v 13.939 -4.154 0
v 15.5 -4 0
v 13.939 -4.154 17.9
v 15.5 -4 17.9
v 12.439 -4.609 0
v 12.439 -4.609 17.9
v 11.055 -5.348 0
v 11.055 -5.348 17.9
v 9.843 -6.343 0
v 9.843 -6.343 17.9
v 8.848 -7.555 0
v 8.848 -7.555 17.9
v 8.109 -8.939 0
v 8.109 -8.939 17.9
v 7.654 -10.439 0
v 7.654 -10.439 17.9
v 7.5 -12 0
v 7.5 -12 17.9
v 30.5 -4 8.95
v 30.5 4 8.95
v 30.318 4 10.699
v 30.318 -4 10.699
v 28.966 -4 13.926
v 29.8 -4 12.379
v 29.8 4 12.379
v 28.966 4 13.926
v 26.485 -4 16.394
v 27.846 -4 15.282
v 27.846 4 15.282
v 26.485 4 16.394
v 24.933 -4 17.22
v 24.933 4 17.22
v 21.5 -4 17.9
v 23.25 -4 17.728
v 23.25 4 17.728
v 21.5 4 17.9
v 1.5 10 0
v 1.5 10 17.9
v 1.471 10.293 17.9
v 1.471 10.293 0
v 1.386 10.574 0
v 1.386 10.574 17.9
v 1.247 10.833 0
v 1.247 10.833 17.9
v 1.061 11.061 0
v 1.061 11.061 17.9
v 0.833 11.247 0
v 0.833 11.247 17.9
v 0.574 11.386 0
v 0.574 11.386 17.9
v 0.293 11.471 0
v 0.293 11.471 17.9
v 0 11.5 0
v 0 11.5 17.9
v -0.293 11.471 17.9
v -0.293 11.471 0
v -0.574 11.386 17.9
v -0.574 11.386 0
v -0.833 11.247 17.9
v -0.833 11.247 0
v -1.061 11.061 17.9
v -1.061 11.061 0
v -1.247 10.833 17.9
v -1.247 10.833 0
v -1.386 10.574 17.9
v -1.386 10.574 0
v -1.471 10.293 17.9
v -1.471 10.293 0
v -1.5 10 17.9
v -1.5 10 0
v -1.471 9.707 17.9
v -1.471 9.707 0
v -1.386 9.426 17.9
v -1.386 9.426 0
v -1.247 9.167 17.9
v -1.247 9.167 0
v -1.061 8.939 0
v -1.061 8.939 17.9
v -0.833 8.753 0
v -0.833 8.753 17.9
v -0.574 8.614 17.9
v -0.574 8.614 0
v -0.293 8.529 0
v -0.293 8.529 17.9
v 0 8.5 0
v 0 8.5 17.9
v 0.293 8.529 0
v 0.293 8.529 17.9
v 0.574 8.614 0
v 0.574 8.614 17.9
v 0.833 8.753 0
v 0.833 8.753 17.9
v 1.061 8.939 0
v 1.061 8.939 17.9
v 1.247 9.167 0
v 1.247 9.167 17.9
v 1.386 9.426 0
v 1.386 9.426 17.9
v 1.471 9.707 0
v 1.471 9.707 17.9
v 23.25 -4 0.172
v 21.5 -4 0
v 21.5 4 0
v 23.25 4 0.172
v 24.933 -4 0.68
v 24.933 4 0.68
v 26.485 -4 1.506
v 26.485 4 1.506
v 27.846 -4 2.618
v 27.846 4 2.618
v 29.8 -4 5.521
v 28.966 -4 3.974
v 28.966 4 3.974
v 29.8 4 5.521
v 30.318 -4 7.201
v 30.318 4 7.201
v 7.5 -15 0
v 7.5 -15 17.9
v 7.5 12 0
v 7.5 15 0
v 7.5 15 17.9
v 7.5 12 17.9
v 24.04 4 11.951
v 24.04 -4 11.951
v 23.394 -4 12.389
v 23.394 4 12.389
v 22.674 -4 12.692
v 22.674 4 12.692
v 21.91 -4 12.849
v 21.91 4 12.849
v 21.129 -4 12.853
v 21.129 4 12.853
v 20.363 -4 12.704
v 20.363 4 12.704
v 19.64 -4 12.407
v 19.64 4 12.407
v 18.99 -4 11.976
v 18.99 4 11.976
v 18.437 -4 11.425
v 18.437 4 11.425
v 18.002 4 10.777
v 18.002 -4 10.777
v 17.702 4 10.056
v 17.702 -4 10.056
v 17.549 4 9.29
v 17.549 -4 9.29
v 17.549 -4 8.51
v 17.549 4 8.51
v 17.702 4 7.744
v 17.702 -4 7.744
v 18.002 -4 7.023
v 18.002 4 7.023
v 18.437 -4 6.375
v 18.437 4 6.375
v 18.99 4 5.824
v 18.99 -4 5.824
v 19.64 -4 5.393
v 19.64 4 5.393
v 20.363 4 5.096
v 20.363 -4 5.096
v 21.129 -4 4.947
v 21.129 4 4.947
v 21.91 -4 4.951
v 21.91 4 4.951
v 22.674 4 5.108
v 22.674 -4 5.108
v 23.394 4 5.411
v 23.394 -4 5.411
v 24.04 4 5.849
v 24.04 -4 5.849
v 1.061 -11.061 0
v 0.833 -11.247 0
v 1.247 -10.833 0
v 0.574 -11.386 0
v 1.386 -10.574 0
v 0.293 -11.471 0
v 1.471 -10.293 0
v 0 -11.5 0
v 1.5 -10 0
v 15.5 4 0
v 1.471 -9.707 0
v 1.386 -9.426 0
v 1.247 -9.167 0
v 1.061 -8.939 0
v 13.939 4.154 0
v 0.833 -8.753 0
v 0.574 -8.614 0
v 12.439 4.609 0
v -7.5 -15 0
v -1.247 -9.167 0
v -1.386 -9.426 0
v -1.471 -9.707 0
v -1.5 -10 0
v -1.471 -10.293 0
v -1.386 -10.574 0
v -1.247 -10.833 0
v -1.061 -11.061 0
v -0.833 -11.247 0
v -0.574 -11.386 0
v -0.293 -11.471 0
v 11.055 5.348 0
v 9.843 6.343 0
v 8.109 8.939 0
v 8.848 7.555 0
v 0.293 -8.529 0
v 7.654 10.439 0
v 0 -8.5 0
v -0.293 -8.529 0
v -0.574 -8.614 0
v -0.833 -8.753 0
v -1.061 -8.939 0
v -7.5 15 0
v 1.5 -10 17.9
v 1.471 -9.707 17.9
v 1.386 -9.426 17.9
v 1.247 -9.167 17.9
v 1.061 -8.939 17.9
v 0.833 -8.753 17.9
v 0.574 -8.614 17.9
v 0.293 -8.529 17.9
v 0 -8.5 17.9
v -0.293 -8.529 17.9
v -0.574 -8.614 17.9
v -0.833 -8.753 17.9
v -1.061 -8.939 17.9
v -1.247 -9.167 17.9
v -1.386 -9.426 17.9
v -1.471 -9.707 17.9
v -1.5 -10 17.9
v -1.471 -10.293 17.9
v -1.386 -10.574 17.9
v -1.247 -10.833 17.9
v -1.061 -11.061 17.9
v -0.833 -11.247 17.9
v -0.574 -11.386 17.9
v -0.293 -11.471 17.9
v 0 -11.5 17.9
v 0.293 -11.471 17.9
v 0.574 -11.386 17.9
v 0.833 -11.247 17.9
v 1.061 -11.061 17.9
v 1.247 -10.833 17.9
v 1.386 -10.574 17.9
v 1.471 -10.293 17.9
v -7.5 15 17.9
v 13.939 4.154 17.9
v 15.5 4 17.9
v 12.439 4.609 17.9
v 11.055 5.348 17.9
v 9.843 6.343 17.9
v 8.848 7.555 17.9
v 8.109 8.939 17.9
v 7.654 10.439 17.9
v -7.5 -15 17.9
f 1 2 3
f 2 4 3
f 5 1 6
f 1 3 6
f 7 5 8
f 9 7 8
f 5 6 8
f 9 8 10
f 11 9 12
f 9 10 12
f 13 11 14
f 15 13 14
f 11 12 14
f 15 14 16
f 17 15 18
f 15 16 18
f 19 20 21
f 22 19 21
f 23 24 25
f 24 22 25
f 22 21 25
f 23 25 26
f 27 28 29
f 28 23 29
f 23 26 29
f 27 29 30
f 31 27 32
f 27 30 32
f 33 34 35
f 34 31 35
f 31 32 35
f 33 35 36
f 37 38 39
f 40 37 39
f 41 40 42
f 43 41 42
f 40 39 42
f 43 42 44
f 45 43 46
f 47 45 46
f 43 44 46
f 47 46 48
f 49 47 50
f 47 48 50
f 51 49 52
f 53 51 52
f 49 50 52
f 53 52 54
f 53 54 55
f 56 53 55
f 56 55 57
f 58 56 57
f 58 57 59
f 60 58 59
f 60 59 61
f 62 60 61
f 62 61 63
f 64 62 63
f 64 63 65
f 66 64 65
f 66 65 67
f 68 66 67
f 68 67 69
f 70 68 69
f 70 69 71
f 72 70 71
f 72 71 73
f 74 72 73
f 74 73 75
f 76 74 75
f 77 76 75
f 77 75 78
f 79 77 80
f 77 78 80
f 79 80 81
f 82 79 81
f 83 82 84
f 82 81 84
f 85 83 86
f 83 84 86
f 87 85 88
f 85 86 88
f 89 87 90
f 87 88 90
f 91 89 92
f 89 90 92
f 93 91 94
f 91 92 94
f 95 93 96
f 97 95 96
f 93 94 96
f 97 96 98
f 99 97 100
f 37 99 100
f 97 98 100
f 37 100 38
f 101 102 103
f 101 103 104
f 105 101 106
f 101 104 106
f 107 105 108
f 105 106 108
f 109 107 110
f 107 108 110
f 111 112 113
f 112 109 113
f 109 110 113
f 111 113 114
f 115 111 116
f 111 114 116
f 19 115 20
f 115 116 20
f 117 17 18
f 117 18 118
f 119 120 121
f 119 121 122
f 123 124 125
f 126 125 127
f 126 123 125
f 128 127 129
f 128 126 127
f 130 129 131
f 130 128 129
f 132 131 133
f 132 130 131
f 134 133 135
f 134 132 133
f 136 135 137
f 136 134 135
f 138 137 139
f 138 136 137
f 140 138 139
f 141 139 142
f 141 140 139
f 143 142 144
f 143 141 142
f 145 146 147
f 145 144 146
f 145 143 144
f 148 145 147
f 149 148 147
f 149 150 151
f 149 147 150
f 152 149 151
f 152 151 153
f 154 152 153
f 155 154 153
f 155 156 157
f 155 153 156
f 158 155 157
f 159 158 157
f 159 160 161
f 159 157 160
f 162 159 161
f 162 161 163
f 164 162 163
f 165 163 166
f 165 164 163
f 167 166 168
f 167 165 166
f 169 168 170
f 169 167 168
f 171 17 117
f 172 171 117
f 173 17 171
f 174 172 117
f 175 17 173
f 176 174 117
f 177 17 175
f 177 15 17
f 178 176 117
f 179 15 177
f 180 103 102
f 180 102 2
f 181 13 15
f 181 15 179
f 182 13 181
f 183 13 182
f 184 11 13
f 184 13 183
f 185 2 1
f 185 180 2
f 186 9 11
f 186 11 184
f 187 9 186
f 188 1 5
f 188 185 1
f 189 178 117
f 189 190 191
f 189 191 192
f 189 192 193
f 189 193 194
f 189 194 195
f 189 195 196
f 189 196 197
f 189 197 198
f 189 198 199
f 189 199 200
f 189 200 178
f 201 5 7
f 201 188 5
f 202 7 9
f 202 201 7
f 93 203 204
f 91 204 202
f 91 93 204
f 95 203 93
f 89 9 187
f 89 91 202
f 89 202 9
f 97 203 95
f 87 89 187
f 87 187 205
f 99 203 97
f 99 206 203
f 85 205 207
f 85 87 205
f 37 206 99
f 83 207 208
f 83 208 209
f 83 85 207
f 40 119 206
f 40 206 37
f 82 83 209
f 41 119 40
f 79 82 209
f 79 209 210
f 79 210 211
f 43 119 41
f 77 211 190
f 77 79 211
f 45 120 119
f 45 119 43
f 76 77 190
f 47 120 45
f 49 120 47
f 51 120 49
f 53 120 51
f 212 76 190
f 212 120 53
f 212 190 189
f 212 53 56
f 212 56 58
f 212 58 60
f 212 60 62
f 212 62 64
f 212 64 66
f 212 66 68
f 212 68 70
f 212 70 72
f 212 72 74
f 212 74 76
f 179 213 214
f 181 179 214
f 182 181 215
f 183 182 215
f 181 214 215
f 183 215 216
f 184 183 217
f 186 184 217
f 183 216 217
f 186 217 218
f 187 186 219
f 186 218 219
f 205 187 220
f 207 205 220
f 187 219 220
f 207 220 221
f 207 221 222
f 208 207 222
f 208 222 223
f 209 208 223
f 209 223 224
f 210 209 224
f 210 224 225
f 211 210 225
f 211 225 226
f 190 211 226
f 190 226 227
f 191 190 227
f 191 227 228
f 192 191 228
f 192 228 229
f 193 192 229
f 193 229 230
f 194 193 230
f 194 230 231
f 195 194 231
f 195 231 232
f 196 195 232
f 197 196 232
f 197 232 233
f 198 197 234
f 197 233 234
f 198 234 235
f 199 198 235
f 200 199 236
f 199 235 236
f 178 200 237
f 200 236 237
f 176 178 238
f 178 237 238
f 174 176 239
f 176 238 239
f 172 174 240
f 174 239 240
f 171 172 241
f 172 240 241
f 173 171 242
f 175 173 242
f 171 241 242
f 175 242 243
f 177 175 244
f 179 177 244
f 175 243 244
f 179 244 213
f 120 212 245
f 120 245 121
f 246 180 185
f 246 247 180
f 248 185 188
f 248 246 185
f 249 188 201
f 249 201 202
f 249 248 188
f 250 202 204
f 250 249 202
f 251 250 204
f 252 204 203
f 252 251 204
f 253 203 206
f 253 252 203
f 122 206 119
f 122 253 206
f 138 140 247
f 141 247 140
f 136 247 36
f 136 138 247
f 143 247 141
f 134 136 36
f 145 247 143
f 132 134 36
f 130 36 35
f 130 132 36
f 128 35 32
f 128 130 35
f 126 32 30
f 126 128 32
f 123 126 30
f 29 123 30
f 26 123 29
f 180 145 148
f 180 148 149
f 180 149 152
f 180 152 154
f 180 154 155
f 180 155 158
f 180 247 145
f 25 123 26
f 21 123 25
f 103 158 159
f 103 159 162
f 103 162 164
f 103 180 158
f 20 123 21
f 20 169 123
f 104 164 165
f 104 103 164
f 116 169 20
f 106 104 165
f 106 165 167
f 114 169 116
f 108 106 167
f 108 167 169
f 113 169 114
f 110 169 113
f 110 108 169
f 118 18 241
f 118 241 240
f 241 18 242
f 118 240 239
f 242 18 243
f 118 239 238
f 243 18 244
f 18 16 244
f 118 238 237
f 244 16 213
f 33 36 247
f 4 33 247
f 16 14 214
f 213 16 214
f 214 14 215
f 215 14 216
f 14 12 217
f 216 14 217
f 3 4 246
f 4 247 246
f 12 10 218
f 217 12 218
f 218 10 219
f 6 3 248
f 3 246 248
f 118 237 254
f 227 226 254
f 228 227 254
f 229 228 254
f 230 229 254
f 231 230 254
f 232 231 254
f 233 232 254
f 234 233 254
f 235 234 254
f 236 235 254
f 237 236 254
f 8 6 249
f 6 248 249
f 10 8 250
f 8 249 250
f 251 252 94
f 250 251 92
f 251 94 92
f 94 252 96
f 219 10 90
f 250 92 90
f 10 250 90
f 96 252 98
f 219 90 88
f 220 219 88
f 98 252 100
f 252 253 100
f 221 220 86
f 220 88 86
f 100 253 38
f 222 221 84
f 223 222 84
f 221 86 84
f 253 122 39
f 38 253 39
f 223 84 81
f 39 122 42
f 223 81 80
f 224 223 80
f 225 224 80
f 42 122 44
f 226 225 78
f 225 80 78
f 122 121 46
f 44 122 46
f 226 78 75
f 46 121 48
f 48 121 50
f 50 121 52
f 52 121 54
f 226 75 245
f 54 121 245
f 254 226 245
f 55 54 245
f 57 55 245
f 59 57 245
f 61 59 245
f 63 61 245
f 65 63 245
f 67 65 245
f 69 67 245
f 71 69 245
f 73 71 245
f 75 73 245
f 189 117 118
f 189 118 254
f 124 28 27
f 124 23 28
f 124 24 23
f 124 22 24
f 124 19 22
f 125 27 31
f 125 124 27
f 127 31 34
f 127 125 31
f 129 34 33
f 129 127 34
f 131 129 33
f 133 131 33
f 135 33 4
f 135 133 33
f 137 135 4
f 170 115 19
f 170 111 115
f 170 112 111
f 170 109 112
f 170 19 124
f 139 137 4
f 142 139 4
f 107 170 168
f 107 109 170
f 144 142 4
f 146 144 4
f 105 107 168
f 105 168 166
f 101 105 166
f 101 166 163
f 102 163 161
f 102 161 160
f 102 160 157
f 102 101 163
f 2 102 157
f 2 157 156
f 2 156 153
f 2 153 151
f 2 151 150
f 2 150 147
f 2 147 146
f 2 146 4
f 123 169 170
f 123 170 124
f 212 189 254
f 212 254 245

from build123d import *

# Parameters (mm, degrees)
BOSS_EXTRU_1_DEPTH      = 17.9
CONG_1_R                = 9
ENL_V_MAT_EXTRU_1_REACH = 42.145
ENL_V_MAT_EXTRU_2_REACH = 40.414
ESQUISSE3_R             = 1.5
CONG_2_R                = 8


with BuildPart() as part:
    # Esquisse1 → Boss.-Extru.1 (new body)
    with BuildSketch(Plane.XY):
        Polygon((7.5, 4), (30.5, 4), (30.5, -4), (7.5, -4), (7.5, -15), (-7.5, -15), (-7.5, 15), (7.5, 15), align=None)
    extrude(amount=BOSS_EXTRU_1_DEPTH)

    # Congé1
    # the kernel refuses this fillet: 9 mm, written as the material it takes off along each edge
    with BuildSketch(Plane(origin=(30.5, 26.5, 0), x_dir=(0, 0, 1), z_dir=(0, -1, 0))) as cong_1_piece_1:
        with BuildLine():
            CenterArc((CONG_1_R, CONG_1_R), CONG_1_R, 180, 90)
            Line((0, CONG_1_R), (0, 0))
            Line((0, 0), (CONG_1_R, 0))
        make_face()
    extrude(amount=53, mode=Mode.SUBTRACT)
    with BuildSketch(Plane(origin=(30.5, 26.5, 17.9), x_dir=(0, 0, -1), z_dir=(0, -1, 0))) as cong_1_piece_2:
        with BuildLine():
            CenterArc((CONG_1_R, -CONG_1_R), CONG_1_R, 90, 90)
            Line((0, -CONG_1_R), (0, 0))
            Line((0, 0), (CONG_1_R, 0))
        make_face()
    extrude(amount=53, mode=Mode.SUBTRACT)

    # Esquisse2 → Enlèv. mat.-Extru.1 (cut, up to next)
    with BuildSketch(Plane(origin=(0, 4, 0), x_dir=(1, 0, 0), z_dir=(0, 1, 0)), mode=Mode.PRIVATE) as enl_v_mat_extru_1_sk1:
        with BuildLine():
            Line((24.04, -5.84888545), (24.04, -11.95111455))
            ThreePointArc((24.04, -11.95111455), (17.53, -8.9), (24.04, -5.84888545))
        make_face()
    enl_v_mat_extru_1_tool1 = extrude(enl_v_mat_extru_1_sk1.sketch, amount=-ENL_V_MAT_EXTRU_1_REACH, mode=Mode.PRIVATE) & part.part
    add(enl_v_mat_extru_1_tool1.solids().sort_by_distance((21.06418, 4, 8.9))[0], mode=Mode.SUBTRACT)

    # Esquisse3 → Enlèv. mat.-Extru.2 (cut, up to next)
    with BuildSketch(Plane.XY.offset(17.9), mode=Mode.PRIVATE) as enl_v_mat_extru_2_sk1:
        with Locations((0, 10)):
            Circle(ESQUISSE3_R)
    enl_v_mat_extru_2_tool1 = extrude(enl_v_mat_extru_2_sk1.sketch, amount=-ENL_V_MAT_EXTRU_2_REACH, mode=Mode.PRIVATE) & part.part
    # Esquisse3 → Enlèv. mat.-Extru.2 (cut, up to next)
    with BuildSketch(Plane.XY.offset(17.9), mode=Mode.PRIVATE) as enl_v_mat_extru_2_sk2:
        with Locations((0, -10)):
            Circle(ESQUISSE3_R)
    enl_v_mat_extru_2_tool2 = extrude(enl_v_mat_extru_2_sk2.sketch, amount=-ENL_V_MAT_EXTRU_2_REACH, mode=Mode.PRIVATE) & part.part
    add(enl_v_mat_extru_2_tool1.solids().sort_by_distance((0, 10, 17.9))[0], mode=Mode.SUBTRACT)
    add(enl_v_mat_extru_2_tool2.solids().sort_by_distance((0, -10, 17.9))[0], mode=Mode.SUBTRACT)

    # Congé2
    cong_2_edges = [part.edges().sort_by_distance(p)[0] for p in [
        (7.5, 4, 8.95),
        (7.5, -4, 8.95),
    ]]
    fillet(cong_2_edges, radius=CONG_2_R)


solid = part.part
